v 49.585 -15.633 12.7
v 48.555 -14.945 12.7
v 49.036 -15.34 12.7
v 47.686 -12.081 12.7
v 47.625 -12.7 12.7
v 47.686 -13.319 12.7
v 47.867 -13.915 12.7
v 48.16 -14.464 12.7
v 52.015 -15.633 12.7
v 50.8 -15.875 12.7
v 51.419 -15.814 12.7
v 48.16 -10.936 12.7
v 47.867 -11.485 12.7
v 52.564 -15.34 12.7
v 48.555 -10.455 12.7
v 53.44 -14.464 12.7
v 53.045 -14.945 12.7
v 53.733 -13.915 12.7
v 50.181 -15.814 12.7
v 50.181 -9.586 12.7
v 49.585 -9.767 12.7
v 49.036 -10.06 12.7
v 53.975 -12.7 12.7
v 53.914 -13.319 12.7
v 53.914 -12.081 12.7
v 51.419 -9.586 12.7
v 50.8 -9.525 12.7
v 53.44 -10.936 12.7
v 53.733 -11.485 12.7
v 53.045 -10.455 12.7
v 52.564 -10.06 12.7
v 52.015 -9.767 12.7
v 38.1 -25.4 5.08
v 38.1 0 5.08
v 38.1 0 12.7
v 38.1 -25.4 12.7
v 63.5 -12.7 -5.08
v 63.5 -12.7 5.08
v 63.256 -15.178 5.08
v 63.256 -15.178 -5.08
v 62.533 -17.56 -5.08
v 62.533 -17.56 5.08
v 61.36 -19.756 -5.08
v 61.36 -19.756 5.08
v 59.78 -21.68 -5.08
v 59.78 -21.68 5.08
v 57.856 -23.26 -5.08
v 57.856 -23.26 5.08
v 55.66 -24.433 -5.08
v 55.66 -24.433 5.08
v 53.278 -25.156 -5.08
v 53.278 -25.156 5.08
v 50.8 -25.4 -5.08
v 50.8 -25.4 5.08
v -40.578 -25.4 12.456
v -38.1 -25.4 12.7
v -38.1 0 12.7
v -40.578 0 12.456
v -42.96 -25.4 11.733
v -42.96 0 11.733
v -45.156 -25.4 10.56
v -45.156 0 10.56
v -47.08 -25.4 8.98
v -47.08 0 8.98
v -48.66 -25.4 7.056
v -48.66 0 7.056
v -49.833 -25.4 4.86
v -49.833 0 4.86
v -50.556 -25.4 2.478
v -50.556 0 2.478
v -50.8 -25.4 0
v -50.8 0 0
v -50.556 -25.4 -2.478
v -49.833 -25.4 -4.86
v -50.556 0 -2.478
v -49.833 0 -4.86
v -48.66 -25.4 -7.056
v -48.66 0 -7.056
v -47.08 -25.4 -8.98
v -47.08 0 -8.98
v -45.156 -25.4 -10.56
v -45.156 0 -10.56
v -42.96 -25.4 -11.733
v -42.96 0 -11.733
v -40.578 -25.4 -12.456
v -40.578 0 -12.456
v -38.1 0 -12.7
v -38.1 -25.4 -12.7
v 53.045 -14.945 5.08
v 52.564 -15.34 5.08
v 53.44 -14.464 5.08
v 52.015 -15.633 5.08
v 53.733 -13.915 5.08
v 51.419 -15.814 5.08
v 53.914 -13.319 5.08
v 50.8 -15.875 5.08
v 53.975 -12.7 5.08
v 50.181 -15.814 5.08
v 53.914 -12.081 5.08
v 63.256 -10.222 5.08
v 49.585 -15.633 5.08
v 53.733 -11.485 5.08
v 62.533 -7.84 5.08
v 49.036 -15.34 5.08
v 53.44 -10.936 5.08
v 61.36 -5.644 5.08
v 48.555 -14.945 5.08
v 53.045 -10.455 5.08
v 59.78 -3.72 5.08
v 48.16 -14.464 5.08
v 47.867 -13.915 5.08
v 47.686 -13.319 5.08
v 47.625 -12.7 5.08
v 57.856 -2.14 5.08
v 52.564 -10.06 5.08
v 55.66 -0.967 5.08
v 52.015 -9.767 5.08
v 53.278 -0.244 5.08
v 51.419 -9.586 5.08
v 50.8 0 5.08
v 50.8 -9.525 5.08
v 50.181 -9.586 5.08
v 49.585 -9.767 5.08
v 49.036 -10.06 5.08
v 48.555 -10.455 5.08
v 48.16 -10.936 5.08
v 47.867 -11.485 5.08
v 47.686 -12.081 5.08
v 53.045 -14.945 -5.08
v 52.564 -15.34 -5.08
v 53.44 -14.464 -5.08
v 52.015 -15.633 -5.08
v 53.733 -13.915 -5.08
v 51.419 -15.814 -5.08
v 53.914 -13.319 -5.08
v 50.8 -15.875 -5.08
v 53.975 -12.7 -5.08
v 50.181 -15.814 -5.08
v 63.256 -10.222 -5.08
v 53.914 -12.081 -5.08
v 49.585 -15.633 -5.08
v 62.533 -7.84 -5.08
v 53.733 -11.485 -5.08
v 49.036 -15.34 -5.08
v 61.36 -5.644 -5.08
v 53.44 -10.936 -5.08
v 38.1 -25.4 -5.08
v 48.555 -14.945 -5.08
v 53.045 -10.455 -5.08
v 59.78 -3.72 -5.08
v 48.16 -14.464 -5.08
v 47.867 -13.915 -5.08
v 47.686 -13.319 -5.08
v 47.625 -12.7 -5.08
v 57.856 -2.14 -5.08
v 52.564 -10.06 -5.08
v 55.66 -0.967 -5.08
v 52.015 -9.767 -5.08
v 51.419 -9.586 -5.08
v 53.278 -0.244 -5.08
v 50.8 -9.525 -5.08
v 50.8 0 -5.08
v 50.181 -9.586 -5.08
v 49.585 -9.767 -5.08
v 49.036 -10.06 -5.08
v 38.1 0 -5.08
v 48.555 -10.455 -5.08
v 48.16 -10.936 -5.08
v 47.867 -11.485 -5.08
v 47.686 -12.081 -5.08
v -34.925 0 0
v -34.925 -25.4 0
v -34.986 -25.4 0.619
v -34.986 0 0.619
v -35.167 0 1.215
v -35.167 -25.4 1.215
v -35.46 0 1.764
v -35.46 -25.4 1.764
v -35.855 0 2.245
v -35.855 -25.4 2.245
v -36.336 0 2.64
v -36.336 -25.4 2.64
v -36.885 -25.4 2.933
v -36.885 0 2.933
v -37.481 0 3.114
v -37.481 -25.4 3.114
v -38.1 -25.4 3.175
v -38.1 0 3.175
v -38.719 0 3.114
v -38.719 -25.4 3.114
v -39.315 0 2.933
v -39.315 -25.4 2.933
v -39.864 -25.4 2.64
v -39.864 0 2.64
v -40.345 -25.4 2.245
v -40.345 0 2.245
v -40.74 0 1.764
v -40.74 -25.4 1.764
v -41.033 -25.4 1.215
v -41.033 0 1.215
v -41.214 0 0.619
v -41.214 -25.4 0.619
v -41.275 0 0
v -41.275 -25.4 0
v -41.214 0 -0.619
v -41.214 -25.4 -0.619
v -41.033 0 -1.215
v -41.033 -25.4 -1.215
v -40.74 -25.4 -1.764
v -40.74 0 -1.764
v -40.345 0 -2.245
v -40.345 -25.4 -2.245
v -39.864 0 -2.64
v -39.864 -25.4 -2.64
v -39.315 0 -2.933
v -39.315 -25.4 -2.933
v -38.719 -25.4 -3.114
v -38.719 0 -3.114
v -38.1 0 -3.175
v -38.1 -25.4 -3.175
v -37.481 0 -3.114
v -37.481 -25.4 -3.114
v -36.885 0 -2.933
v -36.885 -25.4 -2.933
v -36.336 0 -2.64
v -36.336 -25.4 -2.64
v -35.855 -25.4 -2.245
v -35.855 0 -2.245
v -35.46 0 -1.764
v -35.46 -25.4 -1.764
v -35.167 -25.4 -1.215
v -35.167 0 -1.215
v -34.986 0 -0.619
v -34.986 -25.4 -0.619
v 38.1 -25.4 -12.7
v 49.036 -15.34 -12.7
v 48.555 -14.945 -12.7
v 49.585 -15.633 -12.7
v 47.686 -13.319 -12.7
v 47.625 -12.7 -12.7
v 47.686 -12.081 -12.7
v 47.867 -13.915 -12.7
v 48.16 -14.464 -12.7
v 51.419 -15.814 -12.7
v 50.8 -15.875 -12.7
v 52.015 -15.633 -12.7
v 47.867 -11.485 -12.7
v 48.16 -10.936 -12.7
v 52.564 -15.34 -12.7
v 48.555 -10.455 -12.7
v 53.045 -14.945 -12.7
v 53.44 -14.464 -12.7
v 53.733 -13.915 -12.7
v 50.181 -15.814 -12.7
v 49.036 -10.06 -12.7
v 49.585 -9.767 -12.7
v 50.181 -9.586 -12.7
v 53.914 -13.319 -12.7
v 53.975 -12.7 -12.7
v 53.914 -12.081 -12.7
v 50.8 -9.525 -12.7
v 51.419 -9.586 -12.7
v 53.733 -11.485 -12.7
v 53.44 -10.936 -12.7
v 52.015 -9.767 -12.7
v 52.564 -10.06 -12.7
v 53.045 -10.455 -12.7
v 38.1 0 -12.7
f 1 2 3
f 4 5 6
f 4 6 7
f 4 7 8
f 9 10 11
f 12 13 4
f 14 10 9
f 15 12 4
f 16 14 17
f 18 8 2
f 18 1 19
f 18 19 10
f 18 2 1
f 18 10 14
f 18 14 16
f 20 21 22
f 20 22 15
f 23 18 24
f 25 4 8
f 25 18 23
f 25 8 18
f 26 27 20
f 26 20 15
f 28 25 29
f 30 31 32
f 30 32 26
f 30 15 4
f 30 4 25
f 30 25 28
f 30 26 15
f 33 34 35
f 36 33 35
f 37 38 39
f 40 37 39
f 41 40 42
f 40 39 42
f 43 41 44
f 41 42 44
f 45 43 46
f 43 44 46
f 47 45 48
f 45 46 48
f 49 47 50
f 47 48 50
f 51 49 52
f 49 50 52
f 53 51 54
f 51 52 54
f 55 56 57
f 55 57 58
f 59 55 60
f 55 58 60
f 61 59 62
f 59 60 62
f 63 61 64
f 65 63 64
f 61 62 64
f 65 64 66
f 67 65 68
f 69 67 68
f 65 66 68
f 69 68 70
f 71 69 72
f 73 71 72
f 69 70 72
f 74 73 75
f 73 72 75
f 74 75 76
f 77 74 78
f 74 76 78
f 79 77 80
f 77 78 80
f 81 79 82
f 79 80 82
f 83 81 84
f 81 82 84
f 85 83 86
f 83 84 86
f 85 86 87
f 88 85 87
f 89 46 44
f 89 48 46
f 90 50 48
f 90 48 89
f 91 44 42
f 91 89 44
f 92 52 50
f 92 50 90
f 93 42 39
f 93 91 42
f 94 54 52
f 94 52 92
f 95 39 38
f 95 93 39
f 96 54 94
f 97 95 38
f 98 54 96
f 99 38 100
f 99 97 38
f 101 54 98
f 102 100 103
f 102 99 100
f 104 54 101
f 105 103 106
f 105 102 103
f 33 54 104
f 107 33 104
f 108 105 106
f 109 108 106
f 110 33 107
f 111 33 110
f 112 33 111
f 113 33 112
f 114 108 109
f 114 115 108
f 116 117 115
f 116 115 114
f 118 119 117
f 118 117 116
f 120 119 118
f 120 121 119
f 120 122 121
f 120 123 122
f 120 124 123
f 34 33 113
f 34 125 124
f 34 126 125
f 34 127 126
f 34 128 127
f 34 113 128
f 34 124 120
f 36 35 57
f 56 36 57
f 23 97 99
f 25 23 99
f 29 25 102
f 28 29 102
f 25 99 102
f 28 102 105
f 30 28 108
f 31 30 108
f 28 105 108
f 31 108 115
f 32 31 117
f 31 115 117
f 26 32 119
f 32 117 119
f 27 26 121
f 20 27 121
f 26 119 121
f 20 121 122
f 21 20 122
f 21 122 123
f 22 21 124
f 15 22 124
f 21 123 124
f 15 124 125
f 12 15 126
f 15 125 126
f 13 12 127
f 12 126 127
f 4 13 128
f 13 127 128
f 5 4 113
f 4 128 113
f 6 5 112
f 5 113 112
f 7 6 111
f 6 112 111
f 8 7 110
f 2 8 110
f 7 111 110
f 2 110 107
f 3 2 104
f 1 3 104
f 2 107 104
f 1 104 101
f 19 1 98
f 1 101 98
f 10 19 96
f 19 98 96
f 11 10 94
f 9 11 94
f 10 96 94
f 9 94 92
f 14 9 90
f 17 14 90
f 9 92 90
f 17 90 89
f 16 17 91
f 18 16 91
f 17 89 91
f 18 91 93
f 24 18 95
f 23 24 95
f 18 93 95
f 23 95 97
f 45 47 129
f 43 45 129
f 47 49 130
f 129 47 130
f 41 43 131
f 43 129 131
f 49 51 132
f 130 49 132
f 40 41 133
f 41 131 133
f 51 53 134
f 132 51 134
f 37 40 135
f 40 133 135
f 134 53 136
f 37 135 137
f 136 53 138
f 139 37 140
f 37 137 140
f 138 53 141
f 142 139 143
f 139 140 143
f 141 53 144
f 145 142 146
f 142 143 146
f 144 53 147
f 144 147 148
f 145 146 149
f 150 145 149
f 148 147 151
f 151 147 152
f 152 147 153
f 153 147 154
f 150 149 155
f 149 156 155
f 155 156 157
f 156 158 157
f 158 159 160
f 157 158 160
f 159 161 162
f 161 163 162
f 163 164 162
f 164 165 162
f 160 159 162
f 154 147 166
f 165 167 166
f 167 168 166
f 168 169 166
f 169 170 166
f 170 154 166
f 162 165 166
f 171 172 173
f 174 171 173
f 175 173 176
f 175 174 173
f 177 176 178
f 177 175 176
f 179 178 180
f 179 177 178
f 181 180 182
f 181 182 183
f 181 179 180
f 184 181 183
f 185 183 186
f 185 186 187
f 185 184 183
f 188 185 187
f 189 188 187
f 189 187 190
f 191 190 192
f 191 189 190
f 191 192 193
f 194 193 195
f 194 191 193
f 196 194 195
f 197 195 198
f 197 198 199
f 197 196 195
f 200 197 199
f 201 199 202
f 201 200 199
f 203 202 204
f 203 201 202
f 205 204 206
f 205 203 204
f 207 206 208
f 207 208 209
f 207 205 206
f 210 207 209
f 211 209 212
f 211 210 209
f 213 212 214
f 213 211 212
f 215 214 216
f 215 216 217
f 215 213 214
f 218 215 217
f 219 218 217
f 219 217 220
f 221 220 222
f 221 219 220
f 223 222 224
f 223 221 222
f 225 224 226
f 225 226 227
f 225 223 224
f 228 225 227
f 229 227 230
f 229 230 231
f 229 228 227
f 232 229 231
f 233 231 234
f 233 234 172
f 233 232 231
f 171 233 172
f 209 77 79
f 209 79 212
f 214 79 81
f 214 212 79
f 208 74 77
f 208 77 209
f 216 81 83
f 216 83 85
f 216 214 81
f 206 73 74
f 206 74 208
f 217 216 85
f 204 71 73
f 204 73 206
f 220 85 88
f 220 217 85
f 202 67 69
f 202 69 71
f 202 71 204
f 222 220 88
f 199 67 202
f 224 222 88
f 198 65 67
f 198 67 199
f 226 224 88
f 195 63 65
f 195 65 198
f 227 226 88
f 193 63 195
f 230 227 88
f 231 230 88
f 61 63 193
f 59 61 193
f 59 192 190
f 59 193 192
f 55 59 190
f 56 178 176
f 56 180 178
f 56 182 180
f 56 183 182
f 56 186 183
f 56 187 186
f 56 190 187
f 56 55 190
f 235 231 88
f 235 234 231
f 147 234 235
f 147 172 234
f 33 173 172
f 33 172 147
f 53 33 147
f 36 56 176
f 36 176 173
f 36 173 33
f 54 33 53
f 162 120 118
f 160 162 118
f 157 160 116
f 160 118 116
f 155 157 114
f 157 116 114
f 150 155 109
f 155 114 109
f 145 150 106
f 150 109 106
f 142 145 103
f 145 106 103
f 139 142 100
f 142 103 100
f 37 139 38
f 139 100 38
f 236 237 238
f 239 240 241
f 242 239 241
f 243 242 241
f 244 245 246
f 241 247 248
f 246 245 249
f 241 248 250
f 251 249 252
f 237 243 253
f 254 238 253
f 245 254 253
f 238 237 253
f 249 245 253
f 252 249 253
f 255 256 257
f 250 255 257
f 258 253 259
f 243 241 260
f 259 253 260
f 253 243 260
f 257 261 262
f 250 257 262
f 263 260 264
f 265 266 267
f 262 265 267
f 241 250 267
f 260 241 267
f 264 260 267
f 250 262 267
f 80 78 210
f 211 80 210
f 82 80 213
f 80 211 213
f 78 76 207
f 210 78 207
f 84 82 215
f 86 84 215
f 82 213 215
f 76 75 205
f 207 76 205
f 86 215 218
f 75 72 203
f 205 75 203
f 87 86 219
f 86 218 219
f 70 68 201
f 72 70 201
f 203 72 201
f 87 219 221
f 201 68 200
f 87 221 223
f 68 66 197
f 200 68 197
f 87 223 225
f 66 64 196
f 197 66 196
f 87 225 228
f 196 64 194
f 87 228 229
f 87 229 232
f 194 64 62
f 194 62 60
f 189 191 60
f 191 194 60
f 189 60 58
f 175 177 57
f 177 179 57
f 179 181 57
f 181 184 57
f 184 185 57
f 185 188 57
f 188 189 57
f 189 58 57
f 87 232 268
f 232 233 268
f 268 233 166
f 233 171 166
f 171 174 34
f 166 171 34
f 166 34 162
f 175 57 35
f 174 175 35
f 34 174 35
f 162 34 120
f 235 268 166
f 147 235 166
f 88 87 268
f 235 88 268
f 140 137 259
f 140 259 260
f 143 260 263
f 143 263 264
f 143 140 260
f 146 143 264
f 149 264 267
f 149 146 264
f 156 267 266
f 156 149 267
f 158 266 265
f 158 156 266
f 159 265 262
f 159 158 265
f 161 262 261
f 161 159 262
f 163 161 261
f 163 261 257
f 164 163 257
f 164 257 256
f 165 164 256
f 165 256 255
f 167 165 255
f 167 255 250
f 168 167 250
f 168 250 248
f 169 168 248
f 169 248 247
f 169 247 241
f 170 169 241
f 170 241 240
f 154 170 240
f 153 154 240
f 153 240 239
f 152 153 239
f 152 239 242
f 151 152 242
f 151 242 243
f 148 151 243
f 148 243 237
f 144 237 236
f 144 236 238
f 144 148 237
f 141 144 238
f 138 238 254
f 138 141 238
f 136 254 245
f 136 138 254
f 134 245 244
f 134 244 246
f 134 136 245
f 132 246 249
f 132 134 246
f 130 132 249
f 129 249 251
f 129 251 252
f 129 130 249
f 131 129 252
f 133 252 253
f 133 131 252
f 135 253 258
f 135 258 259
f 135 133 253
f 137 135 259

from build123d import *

# Parameters (mm, degrees)
F0_R     = 3.175
F1_DEPTH = 25.4
F2_W     = 25.4
F2_H     = 10.16
F3_DEPTH = 25.4
F5_DEPTH = 25.4
F4_R     = 3.175
F6_DEPTH = 7.62
F7_DEPTH = 25.4


with BuildPart() as f1:
    # F0 (on Front) → F1 (new body)
    with BuildSketch(Plane.XZ):
        with BuildLine():
            Line((38.1, 12.7), (-38.1, 12.7))
            ThreePointArc((-38.1, 12.7), (-50.8, 0), (-38.1, -12.7))
            Line((-38.1, -12.7), (38.1, -12.7))
            Line((38.1, -12.7), (38.1, 12.7))
        make_face()
        with Locations((-38.1, 0)):
            Circle(F0_R, mode=Mode.SUBTRACT)
    extrude(amount=F1_DEPTH)

    # F2 (on face) → F3 (join)
    with BuildSketch(Plane.YZ.offset(38.1)):
        with Locations((-12.7, 0)):
            Rectangle(F2_W, F2_H)
    extrude(amount=F3_DEPTH)

    # F4 (on face) → F5 (cut)
    with BuildSketch(Plane.XY.offset(5.08)):
        with BuildLine():
            ThreePointArc((50.8, 0), (59.7802561211, -3.7197438789), (63.5, -12.7))
            Line((63.5, -12.7), (63.5, 0))
            Line((63.5, 0), (50.8, 0))
        make_face()
        with BuildLine():
            Line((63.5, -25.4), (63.5, -12.7))
            ThreePointArc((63.5, -12.7), (59.7802561211, -21.6802561211), (50.8, -25.4))
            Line((50.8, -25.4), (63.5, -25.4))
        make_face()
    extrude(amount=-F5_DEPTH, mode=Mode.SUBTRACT)

    # F4 (on face) → F6 (join)
    with BuildSketch(Plane.XY.offset(5.08)):
        with Locations((50.8, -12.7)):
            Circle(F4_R)
    extrude(amount=F6_DEPTH)

    # F7 (add): a face of the model
    f7_faces = [f1.faces().sort_by_distance(p)[0] for p in [
        (50.8, -12.7, 12.7),
    ]]
    extrude(f7_faces, amount=-F7_DEPTH)


solid = f1.part
